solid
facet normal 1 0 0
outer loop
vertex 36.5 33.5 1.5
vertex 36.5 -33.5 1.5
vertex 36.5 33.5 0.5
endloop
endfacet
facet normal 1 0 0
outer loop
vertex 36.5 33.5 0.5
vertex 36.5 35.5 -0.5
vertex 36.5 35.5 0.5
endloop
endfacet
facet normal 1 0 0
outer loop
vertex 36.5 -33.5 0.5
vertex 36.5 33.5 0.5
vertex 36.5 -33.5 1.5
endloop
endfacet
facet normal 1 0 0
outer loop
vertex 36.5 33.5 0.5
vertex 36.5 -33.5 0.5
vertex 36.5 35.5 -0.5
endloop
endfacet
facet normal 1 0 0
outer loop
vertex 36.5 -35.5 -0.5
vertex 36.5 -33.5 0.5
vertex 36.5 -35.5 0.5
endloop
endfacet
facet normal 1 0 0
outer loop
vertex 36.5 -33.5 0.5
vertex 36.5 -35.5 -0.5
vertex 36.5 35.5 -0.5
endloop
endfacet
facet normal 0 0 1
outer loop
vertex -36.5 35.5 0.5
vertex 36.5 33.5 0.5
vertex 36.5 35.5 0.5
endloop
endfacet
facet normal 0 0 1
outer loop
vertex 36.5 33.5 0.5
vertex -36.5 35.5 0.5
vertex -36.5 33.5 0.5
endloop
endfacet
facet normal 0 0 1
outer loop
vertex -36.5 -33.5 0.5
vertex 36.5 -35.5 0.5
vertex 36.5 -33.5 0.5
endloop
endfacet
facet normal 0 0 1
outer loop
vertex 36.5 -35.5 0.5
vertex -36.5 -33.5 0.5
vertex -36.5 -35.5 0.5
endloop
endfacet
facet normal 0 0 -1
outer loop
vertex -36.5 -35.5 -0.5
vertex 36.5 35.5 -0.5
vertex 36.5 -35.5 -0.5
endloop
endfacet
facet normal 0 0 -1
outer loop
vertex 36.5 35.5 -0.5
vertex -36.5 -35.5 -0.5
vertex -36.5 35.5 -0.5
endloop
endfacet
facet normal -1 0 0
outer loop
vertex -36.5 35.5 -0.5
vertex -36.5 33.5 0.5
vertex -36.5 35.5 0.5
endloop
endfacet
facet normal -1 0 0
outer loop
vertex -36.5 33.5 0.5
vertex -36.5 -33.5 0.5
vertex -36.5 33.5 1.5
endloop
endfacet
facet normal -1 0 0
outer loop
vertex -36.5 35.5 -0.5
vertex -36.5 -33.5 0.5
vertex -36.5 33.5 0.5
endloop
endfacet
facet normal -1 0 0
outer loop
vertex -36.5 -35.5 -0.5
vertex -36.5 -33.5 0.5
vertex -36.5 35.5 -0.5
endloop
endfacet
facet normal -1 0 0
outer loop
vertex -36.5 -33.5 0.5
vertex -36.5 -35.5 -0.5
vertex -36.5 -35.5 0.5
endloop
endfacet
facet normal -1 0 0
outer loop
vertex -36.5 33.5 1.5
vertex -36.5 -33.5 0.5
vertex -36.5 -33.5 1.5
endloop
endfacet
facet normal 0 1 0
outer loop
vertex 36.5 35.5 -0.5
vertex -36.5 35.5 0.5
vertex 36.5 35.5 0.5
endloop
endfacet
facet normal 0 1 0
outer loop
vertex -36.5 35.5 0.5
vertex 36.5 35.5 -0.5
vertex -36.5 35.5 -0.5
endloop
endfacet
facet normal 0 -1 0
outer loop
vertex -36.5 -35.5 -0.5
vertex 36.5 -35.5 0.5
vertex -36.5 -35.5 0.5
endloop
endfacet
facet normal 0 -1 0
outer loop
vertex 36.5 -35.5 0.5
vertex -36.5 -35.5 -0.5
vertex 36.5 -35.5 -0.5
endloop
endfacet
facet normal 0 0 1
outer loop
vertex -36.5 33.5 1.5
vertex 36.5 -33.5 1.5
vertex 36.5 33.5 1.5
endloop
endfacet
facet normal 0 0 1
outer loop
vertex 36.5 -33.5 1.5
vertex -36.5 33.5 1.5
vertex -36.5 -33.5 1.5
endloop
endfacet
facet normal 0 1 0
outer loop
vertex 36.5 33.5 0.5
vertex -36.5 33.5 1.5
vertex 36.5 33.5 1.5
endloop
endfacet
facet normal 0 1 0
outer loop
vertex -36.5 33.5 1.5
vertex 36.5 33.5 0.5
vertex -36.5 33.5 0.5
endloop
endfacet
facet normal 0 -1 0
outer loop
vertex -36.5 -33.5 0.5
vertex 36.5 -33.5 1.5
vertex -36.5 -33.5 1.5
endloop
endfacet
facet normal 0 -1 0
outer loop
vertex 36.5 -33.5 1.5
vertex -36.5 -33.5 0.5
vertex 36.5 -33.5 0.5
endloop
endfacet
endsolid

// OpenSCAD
cube([73,71,1],center=true);
translate([0,0,0.5]){cube([73,67,2],center=true);};
